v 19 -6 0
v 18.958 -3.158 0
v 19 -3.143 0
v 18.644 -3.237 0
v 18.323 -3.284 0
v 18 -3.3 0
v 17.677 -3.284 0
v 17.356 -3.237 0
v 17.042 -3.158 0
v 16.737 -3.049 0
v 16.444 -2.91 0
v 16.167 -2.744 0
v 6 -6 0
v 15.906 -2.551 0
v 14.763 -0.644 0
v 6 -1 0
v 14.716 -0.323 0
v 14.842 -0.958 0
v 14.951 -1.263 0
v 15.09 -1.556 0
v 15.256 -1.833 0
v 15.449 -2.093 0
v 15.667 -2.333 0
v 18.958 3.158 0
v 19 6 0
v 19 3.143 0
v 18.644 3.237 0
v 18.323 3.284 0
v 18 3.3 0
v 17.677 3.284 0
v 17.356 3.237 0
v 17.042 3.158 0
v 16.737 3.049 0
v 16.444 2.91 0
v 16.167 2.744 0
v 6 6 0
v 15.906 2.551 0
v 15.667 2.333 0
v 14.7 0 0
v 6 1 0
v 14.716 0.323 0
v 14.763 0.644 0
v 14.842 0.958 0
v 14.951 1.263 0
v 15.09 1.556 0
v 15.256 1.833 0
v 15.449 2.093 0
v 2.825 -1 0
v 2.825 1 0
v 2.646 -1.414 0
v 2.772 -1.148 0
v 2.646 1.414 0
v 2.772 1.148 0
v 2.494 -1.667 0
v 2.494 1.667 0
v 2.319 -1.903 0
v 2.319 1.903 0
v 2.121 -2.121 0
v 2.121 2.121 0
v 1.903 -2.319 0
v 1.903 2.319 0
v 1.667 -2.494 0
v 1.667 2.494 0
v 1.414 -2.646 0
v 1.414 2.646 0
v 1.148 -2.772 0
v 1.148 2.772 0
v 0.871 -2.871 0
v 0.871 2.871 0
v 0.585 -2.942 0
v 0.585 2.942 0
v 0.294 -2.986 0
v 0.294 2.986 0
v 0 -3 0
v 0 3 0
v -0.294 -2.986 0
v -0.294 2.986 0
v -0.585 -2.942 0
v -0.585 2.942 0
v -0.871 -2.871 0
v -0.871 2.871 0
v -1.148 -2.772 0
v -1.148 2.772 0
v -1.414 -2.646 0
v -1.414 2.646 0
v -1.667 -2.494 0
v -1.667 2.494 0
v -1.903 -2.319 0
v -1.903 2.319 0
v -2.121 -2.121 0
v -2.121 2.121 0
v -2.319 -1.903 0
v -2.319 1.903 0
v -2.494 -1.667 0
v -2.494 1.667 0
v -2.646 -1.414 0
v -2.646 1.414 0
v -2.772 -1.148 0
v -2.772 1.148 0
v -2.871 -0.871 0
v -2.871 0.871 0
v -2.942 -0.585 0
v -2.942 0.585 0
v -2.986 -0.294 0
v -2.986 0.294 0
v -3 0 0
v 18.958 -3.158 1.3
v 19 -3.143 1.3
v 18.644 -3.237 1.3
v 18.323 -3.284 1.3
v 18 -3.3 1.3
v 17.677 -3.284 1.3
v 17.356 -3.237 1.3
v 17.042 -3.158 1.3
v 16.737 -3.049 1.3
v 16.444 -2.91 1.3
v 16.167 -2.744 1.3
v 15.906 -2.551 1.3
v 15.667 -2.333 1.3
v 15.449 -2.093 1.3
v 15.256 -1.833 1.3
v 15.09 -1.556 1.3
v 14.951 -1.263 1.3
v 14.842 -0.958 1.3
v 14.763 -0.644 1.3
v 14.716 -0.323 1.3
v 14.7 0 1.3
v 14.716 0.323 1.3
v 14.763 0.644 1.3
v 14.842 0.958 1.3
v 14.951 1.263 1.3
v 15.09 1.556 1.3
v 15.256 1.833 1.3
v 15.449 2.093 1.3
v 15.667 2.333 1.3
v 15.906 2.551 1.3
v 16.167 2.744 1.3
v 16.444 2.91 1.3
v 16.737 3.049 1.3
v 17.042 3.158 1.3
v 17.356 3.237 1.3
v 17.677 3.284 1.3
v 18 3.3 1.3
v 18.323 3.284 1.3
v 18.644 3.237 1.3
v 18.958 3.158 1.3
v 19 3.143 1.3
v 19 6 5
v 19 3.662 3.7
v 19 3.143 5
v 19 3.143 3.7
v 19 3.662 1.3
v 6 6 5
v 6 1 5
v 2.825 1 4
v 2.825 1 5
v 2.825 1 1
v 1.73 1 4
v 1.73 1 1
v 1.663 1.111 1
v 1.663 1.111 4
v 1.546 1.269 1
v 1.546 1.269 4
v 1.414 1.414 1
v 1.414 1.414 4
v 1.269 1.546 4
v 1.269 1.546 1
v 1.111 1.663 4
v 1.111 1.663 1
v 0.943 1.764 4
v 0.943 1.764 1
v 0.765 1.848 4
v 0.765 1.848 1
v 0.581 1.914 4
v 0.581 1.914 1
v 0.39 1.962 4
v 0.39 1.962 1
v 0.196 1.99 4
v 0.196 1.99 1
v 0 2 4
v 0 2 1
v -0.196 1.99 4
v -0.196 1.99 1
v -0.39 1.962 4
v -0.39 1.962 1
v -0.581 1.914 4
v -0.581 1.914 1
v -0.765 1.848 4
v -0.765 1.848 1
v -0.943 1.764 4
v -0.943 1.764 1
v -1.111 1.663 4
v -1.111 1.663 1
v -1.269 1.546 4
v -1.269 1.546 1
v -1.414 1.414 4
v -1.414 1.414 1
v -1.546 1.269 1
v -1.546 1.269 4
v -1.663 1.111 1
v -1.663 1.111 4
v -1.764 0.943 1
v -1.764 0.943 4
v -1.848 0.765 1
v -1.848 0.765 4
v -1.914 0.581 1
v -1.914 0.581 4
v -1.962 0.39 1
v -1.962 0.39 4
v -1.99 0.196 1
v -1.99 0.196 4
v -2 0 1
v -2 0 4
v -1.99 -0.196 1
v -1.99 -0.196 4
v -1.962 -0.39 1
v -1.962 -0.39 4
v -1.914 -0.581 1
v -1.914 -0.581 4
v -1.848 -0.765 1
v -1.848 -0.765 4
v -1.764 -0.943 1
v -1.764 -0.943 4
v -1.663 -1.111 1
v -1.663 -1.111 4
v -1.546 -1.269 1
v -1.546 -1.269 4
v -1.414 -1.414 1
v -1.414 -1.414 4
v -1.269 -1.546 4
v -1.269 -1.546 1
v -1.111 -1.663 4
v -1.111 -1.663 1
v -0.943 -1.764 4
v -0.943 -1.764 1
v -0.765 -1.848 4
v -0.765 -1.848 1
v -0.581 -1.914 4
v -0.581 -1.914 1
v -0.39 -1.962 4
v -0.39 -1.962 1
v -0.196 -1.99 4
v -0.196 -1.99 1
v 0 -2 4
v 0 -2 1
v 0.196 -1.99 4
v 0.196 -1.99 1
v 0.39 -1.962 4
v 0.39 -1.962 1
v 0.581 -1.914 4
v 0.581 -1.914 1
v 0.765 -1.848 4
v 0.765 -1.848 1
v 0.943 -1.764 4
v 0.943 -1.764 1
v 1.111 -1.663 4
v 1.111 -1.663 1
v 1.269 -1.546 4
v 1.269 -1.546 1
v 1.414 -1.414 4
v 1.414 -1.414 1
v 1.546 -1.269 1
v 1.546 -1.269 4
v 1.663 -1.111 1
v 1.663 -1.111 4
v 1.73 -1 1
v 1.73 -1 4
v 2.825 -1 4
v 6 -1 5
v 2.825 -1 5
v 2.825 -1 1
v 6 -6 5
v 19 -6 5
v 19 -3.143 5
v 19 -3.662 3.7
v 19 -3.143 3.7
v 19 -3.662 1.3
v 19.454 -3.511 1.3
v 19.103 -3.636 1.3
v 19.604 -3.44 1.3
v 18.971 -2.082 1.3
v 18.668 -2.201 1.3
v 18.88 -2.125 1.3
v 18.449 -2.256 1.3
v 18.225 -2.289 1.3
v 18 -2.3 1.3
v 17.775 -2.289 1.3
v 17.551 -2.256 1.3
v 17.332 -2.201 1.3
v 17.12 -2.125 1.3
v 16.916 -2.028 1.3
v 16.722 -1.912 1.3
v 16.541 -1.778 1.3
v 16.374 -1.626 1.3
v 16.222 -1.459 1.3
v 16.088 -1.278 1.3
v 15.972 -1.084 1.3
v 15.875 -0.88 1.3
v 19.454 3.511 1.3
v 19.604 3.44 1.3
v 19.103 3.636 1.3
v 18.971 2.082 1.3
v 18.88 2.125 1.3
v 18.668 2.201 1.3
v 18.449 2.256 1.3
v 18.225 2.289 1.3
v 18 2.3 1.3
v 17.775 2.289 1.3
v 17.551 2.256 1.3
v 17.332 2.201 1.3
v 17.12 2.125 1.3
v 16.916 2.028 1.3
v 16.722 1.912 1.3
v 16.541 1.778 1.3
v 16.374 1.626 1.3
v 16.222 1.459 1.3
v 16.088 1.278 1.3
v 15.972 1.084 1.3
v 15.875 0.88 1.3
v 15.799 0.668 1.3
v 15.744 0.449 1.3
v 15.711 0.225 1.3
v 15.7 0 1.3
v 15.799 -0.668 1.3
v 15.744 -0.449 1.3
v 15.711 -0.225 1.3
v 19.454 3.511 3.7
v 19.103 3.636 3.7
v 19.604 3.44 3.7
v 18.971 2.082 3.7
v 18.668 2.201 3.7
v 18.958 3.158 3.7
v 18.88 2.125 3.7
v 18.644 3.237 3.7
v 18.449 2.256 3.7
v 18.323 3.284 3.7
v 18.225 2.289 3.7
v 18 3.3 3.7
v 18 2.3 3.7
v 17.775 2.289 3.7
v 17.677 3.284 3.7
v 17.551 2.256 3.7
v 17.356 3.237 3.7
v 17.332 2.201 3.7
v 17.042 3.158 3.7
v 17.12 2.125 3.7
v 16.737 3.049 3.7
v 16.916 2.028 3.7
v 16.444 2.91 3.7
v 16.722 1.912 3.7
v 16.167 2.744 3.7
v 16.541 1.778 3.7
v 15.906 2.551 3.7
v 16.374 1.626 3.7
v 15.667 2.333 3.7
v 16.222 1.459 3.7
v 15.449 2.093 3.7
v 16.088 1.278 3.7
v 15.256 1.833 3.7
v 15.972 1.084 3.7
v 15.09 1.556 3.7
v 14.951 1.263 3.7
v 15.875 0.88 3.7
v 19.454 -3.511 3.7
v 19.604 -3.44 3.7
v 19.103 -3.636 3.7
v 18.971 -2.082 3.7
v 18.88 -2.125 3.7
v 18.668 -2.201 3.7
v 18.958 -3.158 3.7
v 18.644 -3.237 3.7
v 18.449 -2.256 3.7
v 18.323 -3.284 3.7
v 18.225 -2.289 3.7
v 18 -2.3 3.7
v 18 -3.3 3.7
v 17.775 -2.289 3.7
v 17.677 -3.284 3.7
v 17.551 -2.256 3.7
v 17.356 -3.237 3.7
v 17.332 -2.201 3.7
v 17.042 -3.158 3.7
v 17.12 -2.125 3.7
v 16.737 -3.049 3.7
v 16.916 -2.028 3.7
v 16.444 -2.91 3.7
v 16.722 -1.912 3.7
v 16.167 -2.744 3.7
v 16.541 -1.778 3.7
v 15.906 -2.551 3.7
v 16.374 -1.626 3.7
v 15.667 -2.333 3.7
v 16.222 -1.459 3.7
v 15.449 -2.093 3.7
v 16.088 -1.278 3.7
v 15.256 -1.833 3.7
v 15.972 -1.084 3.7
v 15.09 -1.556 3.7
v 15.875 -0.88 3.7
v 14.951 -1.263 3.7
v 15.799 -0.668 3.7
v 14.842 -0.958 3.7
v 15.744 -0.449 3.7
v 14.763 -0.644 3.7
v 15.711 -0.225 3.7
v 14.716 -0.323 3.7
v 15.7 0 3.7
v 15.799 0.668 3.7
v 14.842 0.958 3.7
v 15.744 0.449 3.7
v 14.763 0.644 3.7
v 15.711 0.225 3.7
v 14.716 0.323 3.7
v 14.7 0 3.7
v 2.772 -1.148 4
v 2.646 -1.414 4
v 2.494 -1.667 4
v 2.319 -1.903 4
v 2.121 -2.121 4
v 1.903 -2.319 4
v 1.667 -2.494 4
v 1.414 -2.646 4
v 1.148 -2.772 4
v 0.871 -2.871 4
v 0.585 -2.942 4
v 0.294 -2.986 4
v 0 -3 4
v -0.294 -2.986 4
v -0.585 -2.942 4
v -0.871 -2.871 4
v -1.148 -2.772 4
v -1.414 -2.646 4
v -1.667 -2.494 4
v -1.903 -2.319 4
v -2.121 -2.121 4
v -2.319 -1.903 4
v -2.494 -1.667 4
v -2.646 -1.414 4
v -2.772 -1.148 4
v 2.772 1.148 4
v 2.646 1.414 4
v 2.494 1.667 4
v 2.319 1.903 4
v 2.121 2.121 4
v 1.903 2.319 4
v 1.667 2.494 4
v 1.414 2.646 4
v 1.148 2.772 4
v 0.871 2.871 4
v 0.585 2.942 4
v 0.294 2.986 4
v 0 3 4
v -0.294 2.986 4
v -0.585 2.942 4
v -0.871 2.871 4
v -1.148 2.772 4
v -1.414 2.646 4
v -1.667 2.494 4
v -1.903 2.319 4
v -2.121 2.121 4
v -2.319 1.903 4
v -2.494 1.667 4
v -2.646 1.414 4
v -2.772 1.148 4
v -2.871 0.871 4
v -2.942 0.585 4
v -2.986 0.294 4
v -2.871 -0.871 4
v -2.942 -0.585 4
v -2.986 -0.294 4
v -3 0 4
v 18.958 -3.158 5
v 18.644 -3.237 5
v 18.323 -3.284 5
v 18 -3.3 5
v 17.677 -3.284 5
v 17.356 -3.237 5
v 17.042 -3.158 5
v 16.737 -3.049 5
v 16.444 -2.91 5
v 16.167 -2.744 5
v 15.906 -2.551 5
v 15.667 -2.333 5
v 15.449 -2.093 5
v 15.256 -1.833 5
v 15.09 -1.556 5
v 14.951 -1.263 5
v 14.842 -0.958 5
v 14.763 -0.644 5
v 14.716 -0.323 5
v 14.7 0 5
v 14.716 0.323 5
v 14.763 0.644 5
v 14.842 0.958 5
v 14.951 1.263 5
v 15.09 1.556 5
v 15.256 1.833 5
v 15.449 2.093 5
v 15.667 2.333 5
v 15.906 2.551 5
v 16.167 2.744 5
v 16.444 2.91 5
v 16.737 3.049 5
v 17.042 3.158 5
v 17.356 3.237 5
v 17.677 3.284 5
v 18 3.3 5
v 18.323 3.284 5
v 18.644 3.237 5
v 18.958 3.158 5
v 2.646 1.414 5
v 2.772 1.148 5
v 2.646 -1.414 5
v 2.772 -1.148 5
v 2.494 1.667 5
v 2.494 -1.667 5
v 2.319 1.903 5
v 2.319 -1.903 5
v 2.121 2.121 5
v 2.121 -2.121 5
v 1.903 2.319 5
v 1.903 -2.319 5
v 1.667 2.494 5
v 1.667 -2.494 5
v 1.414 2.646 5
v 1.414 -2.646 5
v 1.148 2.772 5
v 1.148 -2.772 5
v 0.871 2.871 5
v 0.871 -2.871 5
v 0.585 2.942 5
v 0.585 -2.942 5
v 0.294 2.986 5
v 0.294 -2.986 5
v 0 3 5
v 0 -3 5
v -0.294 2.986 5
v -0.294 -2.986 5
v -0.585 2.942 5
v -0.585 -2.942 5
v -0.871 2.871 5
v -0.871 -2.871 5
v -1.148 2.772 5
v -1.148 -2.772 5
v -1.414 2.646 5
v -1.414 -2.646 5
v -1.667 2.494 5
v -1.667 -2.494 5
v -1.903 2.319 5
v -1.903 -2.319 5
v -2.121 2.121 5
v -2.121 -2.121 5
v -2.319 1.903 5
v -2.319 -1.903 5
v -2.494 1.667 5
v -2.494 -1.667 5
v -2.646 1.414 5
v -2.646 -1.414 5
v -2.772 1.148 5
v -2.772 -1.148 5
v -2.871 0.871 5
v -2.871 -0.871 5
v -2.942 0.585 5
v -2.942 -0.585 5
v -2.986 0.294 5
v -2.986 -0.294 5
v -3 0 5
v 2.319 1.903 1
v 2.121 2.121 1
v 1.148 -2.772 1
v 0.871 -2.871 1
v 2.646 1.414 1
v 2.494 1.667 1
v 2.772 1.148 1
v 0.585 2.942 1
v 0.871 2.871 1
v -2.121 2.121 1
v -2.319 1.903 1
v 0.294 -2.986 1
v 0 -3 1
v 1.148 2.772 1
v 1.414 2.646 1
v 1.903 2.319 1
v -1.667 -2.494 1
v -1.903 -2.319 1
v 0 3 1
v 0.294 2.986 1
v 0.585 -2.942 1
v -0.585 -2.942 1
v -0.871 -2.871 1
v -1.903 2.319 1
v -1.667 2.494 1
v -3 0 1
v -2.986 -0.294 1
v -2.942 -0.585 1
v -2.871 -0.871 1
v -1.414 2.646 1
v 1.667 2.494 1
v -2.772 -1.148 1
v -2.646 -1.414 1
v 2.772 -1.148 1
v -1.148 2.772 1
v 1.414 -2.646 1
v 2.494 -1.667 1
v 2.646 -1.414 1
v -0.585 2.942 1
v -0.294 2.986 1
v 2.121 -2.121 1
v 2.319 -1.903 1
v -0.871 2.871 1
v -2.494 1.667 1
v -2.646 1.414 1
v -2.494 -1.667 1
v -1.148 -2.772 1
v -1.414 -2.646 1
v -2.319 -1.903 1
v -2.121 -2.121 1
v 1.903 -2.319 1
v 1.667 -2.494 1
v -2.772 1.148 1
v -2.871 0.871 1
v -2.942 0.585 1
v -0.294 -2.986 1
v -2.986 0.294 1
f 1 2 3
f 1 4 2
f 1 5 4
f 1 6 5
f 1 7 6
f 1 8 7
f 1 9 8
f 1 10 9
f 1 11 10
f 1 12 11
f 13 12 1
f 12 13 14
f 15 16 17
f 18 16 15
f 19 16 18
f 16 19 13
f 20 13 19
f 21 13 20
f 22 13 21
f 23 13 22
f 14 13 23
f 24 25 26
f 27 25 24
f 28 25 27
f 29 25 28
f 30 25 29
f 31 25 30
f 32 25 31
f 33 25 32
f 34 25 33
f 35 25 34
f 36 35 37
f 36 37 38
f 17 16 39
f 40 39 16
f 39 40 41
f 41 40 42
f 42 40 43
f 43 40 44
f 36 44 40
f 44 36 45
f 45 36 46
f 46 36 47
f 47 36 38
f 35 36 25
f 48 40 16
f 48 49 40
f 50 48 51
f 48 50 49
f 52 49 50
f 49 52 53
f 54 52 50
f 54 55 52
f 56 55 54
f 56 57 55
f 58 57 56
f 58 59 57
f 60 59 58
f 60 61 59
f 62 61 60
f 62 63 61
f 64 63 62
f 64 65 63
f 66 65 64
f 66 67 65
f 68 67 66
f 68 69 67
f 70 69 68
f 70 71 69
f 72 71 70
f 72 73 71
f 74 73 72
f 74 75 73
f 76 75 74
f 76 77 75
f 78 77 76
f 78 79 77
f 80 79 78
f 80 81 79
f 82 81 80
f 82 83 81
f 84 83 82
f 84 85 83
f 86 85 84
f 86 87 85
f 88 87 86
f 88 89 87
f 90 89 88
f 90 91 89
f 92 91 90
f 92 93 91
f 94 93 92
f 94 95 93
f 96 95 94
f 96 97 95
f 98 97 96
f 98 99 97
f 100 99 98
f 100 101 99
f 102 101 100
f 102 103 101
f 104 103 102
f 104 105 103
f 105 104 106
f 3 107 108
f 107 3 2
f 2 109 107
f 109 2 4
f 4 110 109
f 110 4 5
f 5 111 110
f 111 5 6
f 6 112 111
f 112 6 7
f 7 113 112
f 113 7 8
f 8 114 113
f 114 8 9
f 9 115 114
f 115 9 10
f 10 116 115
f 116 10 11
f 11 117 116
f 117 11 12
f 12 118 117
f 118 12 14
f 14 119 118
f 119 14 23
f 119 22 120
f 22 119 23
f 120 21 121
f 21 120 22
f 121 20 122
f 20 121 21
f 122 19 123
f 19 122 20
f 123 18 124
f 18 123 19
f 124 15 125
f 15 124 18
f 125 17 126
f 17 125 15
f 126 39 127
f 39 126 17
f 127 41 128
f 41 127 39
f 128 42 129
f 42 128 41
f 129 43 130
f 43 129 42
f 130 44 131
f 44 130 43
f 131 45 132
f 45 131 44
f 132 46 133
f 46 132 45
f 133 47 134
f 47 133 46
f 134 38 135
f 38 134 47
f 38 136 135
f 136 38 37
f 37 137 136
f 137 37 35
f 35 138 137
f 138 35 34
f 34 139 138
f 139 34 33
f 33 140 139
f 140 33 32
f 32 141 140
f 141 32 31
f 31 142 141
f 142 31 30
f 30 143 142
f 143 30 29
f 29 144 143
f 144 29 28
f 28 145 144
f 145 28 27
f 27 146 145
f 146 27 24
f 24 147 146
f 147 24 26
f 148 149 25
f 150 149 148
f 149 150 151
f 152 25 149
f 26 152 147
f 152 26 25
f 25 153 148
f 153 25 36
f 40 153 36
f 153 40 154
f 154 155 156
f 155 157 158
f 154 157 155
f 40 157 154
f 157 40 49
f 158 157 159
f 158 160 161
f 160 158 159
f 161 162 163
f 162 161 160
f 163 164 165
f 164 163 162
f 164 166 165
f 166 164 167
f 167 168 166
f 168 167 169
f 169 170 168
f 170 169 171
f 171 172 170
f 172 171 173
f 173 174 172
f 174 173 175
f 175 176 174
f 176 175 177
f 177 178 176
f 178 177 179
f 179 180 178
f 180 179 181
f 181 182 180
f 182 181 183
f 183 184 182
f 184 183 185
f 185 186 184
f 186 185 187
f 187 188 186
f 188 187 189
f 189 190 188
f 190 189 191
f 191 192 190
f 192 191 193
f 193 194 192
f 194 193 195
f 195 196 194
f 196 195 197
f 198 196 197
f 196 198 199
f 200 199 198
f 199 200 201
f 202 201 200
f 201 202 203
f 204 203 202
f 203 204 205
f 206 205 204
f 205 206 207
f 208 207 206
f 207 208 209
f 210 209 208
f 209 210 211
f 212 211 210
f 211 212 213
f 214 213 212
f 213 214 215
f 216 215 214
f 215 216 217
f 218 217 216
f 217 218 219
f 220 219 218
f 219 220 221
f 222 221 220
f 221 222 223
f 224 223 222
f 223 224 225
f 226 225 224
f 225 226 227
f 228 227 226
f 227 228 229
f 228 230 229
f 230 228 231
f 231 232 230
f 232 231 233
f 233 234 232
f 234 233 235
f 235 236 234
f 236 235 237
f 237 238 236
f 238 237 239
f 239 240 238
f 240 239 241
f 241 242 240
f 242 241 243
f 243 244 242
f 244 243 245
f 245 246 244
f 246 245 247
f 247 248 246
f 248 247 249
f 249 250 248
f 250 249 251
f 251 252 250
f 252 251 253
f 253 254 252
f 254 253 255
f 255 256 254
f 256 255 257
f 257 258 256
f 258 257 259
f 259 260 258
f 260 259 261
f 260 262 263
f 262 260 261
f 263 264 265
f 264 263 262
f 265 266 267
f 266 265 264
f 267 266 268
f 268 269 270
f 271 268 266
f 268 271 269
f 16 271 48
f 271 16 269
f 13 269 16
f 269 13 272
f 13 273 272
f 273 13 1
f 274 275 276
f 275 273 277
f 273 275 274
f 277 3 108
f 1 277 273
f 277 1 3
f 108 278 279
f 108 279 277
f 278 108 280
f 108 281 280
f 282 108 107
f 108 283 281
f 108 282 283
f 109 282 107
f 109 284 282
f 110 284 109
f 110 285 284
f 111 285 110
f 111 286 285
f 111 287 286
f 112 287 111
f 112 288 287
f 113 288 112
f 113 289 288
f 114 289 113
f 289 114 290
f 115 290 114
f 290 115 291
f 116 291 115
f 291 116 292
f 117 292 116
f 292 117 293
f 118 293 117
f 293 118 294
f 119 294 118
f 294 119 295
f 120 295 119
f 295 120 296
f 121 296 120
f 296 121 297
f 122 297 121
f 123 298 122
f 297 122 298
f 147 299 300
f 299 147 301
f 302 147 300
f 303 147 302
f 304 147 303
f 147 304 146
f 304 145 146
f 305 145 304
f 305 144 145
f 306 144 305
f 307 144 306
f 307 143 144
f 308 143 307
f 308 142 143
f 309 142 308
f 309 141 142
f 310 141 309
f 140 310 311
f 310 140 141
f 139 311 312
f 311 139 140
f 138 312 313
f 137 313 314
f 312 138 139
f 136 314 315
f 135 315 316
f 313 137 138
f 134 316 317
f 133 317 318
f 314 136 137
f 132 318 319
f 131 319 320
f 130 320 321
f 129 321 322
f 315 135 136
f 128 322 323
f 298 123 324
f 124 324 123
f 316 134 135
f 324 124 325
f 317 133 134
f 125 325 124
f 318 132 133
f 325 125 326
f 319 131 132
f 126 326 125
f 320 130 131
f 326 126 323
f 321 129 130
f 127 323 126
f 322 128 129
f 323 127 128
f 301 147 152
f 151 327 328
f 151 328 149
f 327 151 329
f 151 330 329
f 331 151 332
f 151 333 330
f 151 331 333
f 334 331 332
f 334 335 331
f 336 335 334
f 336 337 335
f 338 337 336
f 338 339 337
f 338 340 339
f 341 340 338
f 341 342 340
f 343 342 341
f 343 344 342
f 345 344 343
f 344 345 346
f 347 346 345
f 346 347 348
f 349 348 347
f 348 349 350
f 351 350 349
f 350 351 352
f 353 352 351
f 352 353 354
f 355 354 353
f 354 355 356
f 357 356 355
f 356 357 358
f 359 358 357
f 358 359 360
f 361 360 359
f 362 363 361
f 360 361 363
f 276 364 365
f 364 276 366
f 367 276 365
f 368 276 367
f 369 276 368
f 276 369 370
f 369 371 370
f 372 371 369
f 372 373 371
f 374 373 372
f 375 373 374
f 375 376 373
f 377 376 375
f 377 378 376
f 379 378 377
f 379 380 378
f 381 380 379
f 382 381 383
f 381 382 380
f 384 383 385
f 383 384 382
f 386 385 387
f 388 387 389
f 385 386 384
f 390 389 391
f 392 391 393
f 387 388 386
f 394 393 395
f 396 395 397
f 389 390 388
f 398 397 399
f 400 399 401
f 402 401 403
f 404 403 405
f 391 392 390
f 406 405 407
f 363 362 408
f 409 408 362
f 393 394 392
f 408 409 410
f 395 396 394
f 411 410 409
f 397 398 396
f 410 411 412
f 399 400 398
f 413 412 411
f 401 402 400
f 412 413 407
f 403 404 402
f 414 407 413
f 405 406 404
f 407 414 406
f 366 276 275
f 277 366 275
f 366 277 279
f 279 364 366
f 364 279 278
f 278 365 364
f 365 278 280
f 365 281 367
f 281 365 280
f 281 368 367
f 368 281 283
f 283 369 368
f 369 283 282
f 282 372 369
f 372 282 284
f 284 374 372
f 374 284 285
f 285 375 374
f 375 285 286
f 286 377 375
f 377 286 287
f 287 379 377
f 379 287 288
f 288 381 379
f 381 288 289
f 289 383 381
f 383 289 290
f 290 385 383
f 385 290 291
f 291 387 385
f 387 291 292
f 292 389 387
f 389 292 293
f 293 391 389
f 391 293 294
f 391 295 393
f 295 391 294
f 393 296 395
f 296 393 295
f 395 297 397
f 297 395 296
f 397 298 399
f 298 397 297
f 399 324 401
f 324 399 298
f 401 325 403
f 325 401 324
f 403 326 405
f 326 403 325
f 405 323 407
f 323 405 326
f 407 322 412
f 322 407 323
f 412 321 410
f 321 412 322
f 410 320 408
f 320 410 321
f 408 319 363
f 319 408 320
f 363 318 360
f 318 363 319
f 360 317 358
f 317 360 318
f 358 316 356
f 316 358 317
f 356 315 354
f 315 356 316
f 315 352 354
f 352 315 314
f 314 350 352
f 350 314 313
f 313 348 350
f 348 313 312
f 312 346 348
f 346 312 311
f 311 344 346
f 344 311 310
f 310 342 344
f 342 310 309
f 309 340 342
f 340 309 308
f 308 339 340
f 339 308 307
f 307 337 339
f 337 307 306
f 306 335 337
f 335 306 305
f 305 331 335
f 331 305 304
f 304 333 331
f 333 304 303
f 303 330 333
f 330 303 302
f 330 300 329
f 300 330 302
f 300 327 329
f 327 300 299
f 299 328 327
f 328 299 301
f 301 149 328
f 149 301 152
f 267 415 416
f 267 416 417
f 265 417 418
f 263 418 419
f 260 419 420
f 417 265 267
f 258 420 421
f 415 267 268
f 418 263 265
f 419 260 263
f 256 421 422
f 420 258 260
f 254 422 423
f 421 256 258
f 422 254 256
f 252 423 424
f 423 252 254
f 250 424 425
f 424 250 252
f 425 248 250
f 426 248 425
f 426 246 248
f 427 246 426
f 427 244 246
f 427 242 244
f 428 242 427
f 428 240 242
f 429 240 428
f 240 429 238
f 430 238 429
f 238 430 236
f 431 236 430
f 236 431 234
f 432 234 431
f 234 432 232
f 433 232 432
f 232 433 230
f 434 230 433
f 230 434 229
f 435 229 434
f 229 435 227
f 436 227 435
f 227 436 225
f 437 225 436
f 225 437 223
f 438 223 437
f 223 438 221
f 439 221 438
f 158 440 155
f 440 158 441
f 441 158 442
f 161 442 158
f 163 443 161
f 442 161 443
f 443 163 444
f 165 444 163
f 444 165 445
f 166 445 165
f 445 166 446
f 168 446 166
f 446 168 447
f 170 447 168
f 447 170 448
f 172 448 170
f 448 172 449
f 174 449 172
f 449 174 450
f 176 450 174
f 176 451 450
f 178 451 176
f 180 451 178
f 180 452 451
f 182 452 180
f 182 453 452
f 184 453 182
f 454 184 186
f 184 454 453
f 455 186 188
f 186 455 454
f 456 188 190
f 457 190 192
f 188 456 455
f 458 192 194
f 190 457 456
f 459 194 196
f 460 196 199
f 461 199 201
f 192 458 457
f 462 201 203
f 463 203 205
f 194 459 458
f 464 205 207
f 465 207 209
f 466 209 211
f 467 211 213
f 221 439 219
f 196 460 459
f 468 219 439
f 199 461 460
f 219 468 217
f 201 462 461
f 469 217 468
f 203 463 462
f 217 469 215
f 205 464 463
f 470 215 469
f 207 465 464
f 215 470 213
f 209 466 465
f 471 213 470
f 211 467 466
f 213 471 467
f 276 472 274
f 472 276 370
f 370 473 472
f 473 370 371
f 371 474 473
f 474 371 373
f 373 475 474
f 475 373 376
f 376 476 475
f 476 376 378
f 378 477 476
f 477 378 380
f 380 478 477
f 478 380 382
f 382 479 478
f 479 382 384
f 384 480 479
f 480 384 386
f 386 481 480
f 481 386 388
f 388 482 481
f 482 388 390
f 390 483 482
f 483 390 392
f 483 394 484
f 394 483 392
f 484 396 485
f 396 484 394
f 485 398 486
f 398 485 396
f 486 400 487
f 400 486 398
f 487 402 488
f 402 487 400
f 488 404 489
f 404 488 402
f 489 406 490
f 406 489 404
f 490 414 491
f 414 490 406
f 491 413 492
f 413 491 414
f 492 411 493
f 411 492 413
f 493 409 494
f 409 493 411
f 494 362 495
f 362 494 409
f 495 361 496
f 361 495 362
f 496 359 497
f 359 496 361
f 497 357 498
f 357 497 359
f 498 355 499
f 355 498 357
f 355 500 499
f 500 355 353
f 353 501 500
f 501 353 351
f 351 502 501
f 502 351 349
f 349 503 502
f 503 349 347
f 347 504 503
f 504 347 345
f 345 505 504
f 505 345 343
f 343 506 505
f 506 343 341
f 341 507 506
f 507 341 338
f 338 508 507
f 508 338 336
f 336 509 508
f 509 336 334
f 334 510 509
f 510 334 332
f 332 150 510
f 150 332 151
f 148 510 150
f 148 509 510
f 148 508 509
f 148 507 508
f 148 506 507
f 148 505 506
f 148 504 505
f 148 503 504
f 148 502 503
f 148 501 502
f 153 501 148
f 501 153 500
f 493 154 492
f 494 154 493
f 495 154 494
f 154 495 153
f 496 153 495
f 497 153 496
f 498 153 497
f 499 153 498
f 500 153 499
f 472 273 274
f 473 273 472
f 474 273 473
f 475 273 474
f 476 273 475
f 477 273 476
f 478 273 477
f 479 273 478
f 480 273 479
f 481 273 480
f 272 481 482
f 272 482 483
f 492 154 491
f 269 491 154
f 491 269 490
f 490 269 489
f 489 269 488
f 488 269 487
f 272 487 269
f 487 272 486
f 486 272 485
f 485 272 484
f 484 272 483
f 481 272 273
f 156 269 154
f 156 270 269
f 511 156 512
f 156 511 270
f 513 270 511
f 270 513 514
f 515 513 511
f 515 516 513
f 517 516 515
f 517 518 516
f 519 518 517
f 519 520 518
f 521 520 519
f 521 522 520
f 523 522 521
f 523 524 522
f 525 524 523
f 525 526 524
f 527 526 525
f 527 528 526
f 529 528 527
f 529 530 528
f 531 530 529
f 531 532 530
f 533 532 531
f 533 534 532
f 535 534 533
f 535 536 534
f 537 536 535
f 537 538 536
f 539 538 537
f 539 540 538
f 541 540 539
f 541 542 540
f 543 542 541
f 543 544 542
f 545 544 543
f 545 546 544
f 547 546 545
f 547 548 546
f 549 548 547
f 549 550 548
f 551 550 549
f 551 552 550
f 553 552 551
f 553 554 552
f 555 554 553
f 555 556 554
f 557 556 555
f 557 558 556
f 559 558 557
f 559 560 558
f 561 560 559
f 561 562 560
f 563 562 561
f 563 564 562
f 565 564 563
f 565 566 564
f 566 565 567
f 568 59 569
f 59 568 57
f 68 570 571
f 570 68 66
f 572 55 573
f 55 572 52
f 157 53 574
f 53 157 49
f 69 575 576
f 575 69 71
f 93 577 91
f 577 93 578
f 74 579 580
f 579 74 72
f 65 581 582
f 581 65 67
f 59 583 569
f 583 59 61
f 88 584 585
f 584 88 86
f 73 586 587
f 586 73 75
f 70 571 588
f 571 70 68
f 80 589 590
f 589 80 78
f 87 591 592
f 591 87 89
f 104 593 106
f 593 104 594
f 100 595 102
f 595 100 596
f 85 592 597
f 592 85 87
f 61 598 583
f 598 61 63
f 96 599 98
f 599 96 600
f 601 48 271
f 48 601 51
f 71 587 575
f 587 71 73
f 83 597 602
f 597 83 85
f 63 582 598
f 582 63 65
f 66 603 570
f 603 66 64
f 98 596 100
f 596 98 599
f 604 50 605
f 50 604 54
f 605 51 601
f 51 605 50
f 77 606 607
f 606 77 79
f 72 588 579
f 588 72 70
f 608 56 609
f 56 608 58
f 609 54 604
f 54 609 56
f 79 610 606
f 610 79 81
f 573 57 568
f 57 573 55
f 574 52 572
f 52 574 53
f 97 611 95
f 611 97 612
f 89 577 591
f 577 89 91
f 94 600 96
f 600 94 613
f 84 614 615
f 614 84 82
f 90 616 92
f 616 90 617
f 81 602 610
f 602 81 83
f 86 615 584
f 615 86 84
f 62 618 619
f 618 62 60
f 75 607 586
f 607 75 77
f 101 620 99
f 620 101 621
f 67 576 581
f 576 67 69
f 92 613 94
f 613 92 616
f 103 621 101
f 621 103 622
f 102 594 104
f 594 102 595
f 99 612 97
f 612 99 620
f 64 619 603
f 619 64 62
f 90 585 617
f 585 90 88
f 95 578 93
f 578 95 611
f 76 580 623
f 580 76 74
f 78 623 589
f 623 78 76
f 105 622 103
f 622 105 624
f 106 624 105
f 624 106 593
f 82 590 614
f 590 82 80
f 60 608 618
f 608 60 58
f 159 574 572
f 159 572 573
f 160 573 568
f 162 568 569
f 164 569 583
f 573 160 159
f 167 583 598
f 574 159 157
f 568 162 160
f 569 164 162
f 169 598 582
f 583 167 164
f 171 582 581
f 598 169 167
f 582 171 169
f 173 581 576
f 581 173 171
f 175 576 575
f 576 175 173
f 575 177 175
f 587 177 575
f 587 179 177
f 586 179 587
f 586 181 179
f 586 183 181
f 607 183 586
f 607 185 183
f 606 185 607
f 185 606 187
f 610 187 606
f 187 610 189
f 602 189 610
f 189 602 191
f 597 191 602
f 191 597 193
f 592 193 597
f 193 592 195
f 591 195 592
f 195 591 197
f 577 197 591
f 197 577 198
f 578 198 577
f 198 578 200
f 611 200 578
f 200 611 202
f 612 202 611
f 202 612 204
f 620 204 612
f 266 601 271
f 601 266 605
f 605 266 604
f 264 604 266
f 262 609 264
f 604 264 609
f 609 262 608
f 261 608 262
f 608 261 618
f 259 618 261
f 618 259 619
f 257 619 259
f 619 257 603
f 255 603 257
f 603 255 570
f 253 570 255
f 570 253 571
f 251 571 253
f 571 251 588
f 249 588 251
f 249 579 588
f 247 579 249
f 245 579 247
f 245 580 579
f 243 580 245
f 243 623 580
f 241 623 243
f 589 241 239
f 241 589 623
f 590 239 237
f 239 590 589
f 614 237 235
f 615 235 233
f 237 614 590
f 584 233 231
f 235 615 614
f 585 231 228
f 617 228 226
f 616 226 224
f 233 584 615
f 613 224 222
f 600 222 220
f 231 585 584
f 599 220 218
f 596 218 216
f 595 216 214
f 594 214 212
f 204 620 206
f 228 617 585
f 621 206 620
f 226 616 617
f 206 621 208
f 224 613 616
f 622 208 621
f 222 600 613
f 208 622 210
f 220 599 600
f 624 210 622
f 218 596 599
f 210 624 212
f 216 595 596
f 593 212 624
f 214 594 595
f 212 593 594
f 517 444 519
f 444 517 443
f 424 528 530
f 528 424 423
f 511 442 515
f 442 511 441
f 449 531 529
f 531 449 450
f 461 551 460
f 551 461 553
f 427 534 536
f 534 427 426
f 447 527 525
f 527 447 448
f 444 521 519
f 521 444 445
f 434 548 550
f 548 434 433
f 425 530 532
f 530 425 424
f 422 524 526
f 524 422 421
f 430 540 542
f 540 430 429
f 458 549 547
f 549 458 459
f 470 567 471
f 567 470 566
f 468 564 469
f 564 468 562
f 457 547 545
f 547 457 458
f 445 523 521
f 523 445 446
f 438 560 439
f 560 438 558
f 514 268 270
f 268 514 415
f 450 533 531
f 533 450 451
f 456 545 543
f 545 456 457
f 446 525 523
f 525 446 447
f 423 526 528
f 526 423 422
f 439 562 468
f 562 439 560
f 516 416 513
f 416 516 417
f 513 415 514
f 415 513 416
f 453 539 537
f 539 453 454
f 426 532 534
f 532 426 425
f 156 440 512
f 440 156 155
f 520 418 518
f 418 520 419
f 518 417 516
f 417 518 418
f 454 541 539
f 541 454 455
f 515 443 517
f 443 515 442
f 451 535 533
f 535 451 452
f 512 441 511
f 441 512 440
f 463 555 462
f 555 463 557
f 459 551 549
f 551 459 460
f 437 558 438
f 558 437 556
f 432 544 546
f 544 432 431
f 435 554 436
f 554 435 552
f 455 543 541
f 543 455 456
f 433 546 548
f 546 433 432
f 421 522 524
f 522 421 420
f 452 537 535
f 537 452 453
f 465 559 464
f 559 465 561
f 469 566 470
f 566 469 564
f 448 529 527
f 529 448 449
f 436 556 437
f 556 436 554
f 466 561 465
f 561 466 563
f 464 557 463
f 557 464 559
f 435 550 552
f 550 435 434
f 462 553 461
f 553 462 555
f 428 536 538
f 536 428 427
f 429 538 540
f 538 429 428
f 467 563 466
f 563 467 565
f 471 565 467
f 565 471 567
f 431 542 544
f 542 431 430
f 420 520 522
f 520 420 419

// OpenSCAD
part = "link"; // [link, assembly]
cadverify_only = "";
module instance(name, part, unit = 1) {
    echo(cadverify_instance = [name, part, unit]);
    if (cadverify_only == "" || cadverify_only == name) children();
}

// Parameters (mm)
pitch = 18;          // pin-to-bore distance (10 links = 180mm)
link_w = 12;         // width (Y)
link_t = 5;          // thickness (Z)
pin_d = 4;           // pin shaft diameter
bore_d = 4.6;        // bore diameter (0.3 radial clearance)
cap_d = 6;           // cap diameter
cap_h = 1;           // cap thickness
gap_z = 0.3;         // vertical clearance cap<->knuckle
kn_out_d = 7.6;      // knuckle outer diameter (1.5 wall)
cap_cav_d = 6.6;     // cap cavity diameter (0.3 radial clearance)
neck_w = 2;          // neck width
slot_half = 65;      // slot half-angle (deg), allows +-30 deg swing
yoke_west = 6;       // yoke west edge (local X)
yoke_east = 19;      // yoke east extent (local X, 1.0 past bore)
$fn = 64;

module link_geom() {
    bore_x = pitch;
    pin_r = pin_d/2;
    bore_r = bore_d/2;
    kn_out_r = kn_out_d/2;
    cav_r = cap_cav_d/2;
    cap_r = cap_d/2;
    wedge_far = 30;
    dy_far = wedge_far * tan(slot_half);
    bot_h = cap_h;            // 0..1
    gap_h = gap_z;            // 0.3
    kn_h = link_t - 2*cap_h - 2*gap_h; // 2.4 (1.3..3.7)
    // bottom (0..1): pin+neck+yoke minus cap cavity minus slot
    translate([0,0,0]) linear_extrude(height = bot_h, convexity = 8) {
        difference() {
            union() {
                circle(r = pin_r);
                translate([0,-neck_w/2]) square([yoke_west+1, neck_w]);
                translate([yoke_west,-link_w/2]) square([yoke_east-yoke_west, link_w]);
            }
            translate([bore_x,0]) circle(r = cav_r);
            polygon(points = [[bore_x,0],[bore_x+wedge_far, dy_far],[bore_x+wedge_far, -dy_far]]);
        }
    }
    // lower gap (1..1.3): same footprint
    translate([0,0,bot_h]) linear_extrude(height = gap_h, convexity = 8) {
        difference() {
            union() {
                circle(r = pin_r);
                translate([0,-neck_w/2]) square([yoke_west+1, neck_w]);
                translate([yoke_west,-link_w/2]) square([yoke_east-yoke_west, link_w]);
            }
            translate([bore_x,0]) circle(r = cav_r);
            polygon(points = [[bore_x,0],[bore_x+wedge_far, dy_far],[bore_x+wedge_far, -dy_far]]);
        }
    }
    // middle knuckle zone (1.3..3.7)
    translate([0,0,bot_h+gap_h]) linear_extrude(height = kn_h, convexity = 8) {
        difference() {
            union() {
                circle(r = pin_r);
                translate([0,-neck_w/2]) square([yoke_west+1, neck_w]);
                translate([yoke_west,-link_w/2]) square([yoke_east-yoke_west, link_w]);
                translate([bore_x,0]) circle(r = kn_out_r);
            }
            translate([bore_x,0]) circle(r = bore_r);
            polygon(points = [[bore_x,0],[bore_x+wedge_far, dy_far],[bore_x+wedge_far, -dy_far]]);
        }
    }
    // upper gap (3.7..4)
    translate([0,0,bot_h+gap_h+kn_h]) linear_extrude(height = gap_h, convexity = 8) {
        difference() {
            union() {
                circle(r = pin_r);
                translate([0,-neck_w/2]) square([yoke_west+1, neck_w]);
                translate([yoke_west,-link_w/2]) square([yoke_east-yoke_west, link_w]);
            }
            translate([bore_x,0]) circle(r = cav_r);
            polygon(points = [[bore_x,0],[bore_x+wedge_far, dy_far],[bore_x+wedge_far, -dy_far]]);
        }
    }
    // top (4..5)
    translate([0,0,bot_h+gap_h+kn_h+gap_h]) linear_extrude(height = bot_h, convexity = 8) {
        difference() {
            union() {
                circle(r = pin_r);
                translate([0,-neck_w/2]) square([yoke_west+1, neck_w]);
                translate([yoke_west,-link_w/2]) square([yoke_east-yoke_west, link_w]);
            }
            translate([bore_x,0]) circle(r = cav_r);
            polygon(points = [[bore_x,0],[bore_x+wedge_far, dy_far],[bore_x+wedge_far, -dy_far]]);
        }
    }
    // caps (pin ends)
    translate([0,0,0]) cylinder(h = cap_h, r = cap_r);
    translate([0,0,link_t-cap_h]) cylinder(h = cap_h, r = cap_r);
}

if (part == "assembly") {
    instance("link1", "link", 1) translate([0,0,0]) link_geom();
    instance("link2", "link", 1) translate([18,0,0]) link_geom();
    instance("link3", "link", 1) translate([36,0,0]) link_geom();
    echo(cadverify_spec = [
        ["bounds", [[-3, -6, 0], [56.5, 6, 5]]],
        ["support_faces", [["bed", "-z", 200]]],
        ["motions", [
            ["bend", ["link3"], "rotate", [36, 0, 0], [0, 0, 1], [-30, 30]]
        ]],
        ["assembly_order", [
            [["link1", "link2", "link3"], [0, 0, 0]]
        ]],
        ["print_in_place", 0.3],
        ["overhangs_allowed", [
            ["pin cap link1", [[-3, -3, 3.8], [3, 3, 4.2]]],
            ["knuckle joint1", [[14, -4, 1.0], [22, 4, 1.6]]],
            ["pin cap link2", [[15, -3, 3.8], [21, 3, 4.2]]],
            ["knuckle joint2", [[32, -4, 1.0], [40, 4, 1.6]]],
            ["pin cap link3", [[33, -3, 3.8], [39, 3, 4.2]]],
            ["knuckle end", [[50, -4, 1.0], [58, 4, 1.6]]]
        ]],
        ["held", ["link1", "link2", "link3"]]
    ]);
} else {
    link_geom();
    echo(cadverify_spec = [
        ["bounds", [[-3, -6, 0], [19.7, 6, 5]]],
        ["bodies", 1],
        ["through_holes", 0],
        ["support_faces", [["bed", "-z", 100]]],
        ["overhangs_allowed", [
            ["pin cap", [[-3, -3, 3.8], [3, 3, 4.2]]],
            ["knuckle ceiling", [[14, -4, 1.0], [22, 4, 1.6]]]
        ]],
        ["copies", 3],
        ["details", [
            ["body", "material", [[6, -6, 0], [14, 6, 5]], 0.85],
            ["neck", "material", [[0, -1, 0], [7, 1, 5]], 0.8],
            ["knuckle", "material", [[14.2, -3.8, 1.3], [21.8, 3.8, 3.7]], 0.25],
            ["slot", "void", [[19, -1, 0], [21, 1, 5]], 0.8],
            ["cap_cavity", "void", [[14.7, -3.3, 0], [21.3, 3.3, 1]], 0.5],
            ["wall", "thickness", [18, 7, 2.5], [0, -1, 0], 3.7],
            ["floor", "thickness", [9, 0, -1], [0, 0, 1], 5]
        ]]
    ]);
}
